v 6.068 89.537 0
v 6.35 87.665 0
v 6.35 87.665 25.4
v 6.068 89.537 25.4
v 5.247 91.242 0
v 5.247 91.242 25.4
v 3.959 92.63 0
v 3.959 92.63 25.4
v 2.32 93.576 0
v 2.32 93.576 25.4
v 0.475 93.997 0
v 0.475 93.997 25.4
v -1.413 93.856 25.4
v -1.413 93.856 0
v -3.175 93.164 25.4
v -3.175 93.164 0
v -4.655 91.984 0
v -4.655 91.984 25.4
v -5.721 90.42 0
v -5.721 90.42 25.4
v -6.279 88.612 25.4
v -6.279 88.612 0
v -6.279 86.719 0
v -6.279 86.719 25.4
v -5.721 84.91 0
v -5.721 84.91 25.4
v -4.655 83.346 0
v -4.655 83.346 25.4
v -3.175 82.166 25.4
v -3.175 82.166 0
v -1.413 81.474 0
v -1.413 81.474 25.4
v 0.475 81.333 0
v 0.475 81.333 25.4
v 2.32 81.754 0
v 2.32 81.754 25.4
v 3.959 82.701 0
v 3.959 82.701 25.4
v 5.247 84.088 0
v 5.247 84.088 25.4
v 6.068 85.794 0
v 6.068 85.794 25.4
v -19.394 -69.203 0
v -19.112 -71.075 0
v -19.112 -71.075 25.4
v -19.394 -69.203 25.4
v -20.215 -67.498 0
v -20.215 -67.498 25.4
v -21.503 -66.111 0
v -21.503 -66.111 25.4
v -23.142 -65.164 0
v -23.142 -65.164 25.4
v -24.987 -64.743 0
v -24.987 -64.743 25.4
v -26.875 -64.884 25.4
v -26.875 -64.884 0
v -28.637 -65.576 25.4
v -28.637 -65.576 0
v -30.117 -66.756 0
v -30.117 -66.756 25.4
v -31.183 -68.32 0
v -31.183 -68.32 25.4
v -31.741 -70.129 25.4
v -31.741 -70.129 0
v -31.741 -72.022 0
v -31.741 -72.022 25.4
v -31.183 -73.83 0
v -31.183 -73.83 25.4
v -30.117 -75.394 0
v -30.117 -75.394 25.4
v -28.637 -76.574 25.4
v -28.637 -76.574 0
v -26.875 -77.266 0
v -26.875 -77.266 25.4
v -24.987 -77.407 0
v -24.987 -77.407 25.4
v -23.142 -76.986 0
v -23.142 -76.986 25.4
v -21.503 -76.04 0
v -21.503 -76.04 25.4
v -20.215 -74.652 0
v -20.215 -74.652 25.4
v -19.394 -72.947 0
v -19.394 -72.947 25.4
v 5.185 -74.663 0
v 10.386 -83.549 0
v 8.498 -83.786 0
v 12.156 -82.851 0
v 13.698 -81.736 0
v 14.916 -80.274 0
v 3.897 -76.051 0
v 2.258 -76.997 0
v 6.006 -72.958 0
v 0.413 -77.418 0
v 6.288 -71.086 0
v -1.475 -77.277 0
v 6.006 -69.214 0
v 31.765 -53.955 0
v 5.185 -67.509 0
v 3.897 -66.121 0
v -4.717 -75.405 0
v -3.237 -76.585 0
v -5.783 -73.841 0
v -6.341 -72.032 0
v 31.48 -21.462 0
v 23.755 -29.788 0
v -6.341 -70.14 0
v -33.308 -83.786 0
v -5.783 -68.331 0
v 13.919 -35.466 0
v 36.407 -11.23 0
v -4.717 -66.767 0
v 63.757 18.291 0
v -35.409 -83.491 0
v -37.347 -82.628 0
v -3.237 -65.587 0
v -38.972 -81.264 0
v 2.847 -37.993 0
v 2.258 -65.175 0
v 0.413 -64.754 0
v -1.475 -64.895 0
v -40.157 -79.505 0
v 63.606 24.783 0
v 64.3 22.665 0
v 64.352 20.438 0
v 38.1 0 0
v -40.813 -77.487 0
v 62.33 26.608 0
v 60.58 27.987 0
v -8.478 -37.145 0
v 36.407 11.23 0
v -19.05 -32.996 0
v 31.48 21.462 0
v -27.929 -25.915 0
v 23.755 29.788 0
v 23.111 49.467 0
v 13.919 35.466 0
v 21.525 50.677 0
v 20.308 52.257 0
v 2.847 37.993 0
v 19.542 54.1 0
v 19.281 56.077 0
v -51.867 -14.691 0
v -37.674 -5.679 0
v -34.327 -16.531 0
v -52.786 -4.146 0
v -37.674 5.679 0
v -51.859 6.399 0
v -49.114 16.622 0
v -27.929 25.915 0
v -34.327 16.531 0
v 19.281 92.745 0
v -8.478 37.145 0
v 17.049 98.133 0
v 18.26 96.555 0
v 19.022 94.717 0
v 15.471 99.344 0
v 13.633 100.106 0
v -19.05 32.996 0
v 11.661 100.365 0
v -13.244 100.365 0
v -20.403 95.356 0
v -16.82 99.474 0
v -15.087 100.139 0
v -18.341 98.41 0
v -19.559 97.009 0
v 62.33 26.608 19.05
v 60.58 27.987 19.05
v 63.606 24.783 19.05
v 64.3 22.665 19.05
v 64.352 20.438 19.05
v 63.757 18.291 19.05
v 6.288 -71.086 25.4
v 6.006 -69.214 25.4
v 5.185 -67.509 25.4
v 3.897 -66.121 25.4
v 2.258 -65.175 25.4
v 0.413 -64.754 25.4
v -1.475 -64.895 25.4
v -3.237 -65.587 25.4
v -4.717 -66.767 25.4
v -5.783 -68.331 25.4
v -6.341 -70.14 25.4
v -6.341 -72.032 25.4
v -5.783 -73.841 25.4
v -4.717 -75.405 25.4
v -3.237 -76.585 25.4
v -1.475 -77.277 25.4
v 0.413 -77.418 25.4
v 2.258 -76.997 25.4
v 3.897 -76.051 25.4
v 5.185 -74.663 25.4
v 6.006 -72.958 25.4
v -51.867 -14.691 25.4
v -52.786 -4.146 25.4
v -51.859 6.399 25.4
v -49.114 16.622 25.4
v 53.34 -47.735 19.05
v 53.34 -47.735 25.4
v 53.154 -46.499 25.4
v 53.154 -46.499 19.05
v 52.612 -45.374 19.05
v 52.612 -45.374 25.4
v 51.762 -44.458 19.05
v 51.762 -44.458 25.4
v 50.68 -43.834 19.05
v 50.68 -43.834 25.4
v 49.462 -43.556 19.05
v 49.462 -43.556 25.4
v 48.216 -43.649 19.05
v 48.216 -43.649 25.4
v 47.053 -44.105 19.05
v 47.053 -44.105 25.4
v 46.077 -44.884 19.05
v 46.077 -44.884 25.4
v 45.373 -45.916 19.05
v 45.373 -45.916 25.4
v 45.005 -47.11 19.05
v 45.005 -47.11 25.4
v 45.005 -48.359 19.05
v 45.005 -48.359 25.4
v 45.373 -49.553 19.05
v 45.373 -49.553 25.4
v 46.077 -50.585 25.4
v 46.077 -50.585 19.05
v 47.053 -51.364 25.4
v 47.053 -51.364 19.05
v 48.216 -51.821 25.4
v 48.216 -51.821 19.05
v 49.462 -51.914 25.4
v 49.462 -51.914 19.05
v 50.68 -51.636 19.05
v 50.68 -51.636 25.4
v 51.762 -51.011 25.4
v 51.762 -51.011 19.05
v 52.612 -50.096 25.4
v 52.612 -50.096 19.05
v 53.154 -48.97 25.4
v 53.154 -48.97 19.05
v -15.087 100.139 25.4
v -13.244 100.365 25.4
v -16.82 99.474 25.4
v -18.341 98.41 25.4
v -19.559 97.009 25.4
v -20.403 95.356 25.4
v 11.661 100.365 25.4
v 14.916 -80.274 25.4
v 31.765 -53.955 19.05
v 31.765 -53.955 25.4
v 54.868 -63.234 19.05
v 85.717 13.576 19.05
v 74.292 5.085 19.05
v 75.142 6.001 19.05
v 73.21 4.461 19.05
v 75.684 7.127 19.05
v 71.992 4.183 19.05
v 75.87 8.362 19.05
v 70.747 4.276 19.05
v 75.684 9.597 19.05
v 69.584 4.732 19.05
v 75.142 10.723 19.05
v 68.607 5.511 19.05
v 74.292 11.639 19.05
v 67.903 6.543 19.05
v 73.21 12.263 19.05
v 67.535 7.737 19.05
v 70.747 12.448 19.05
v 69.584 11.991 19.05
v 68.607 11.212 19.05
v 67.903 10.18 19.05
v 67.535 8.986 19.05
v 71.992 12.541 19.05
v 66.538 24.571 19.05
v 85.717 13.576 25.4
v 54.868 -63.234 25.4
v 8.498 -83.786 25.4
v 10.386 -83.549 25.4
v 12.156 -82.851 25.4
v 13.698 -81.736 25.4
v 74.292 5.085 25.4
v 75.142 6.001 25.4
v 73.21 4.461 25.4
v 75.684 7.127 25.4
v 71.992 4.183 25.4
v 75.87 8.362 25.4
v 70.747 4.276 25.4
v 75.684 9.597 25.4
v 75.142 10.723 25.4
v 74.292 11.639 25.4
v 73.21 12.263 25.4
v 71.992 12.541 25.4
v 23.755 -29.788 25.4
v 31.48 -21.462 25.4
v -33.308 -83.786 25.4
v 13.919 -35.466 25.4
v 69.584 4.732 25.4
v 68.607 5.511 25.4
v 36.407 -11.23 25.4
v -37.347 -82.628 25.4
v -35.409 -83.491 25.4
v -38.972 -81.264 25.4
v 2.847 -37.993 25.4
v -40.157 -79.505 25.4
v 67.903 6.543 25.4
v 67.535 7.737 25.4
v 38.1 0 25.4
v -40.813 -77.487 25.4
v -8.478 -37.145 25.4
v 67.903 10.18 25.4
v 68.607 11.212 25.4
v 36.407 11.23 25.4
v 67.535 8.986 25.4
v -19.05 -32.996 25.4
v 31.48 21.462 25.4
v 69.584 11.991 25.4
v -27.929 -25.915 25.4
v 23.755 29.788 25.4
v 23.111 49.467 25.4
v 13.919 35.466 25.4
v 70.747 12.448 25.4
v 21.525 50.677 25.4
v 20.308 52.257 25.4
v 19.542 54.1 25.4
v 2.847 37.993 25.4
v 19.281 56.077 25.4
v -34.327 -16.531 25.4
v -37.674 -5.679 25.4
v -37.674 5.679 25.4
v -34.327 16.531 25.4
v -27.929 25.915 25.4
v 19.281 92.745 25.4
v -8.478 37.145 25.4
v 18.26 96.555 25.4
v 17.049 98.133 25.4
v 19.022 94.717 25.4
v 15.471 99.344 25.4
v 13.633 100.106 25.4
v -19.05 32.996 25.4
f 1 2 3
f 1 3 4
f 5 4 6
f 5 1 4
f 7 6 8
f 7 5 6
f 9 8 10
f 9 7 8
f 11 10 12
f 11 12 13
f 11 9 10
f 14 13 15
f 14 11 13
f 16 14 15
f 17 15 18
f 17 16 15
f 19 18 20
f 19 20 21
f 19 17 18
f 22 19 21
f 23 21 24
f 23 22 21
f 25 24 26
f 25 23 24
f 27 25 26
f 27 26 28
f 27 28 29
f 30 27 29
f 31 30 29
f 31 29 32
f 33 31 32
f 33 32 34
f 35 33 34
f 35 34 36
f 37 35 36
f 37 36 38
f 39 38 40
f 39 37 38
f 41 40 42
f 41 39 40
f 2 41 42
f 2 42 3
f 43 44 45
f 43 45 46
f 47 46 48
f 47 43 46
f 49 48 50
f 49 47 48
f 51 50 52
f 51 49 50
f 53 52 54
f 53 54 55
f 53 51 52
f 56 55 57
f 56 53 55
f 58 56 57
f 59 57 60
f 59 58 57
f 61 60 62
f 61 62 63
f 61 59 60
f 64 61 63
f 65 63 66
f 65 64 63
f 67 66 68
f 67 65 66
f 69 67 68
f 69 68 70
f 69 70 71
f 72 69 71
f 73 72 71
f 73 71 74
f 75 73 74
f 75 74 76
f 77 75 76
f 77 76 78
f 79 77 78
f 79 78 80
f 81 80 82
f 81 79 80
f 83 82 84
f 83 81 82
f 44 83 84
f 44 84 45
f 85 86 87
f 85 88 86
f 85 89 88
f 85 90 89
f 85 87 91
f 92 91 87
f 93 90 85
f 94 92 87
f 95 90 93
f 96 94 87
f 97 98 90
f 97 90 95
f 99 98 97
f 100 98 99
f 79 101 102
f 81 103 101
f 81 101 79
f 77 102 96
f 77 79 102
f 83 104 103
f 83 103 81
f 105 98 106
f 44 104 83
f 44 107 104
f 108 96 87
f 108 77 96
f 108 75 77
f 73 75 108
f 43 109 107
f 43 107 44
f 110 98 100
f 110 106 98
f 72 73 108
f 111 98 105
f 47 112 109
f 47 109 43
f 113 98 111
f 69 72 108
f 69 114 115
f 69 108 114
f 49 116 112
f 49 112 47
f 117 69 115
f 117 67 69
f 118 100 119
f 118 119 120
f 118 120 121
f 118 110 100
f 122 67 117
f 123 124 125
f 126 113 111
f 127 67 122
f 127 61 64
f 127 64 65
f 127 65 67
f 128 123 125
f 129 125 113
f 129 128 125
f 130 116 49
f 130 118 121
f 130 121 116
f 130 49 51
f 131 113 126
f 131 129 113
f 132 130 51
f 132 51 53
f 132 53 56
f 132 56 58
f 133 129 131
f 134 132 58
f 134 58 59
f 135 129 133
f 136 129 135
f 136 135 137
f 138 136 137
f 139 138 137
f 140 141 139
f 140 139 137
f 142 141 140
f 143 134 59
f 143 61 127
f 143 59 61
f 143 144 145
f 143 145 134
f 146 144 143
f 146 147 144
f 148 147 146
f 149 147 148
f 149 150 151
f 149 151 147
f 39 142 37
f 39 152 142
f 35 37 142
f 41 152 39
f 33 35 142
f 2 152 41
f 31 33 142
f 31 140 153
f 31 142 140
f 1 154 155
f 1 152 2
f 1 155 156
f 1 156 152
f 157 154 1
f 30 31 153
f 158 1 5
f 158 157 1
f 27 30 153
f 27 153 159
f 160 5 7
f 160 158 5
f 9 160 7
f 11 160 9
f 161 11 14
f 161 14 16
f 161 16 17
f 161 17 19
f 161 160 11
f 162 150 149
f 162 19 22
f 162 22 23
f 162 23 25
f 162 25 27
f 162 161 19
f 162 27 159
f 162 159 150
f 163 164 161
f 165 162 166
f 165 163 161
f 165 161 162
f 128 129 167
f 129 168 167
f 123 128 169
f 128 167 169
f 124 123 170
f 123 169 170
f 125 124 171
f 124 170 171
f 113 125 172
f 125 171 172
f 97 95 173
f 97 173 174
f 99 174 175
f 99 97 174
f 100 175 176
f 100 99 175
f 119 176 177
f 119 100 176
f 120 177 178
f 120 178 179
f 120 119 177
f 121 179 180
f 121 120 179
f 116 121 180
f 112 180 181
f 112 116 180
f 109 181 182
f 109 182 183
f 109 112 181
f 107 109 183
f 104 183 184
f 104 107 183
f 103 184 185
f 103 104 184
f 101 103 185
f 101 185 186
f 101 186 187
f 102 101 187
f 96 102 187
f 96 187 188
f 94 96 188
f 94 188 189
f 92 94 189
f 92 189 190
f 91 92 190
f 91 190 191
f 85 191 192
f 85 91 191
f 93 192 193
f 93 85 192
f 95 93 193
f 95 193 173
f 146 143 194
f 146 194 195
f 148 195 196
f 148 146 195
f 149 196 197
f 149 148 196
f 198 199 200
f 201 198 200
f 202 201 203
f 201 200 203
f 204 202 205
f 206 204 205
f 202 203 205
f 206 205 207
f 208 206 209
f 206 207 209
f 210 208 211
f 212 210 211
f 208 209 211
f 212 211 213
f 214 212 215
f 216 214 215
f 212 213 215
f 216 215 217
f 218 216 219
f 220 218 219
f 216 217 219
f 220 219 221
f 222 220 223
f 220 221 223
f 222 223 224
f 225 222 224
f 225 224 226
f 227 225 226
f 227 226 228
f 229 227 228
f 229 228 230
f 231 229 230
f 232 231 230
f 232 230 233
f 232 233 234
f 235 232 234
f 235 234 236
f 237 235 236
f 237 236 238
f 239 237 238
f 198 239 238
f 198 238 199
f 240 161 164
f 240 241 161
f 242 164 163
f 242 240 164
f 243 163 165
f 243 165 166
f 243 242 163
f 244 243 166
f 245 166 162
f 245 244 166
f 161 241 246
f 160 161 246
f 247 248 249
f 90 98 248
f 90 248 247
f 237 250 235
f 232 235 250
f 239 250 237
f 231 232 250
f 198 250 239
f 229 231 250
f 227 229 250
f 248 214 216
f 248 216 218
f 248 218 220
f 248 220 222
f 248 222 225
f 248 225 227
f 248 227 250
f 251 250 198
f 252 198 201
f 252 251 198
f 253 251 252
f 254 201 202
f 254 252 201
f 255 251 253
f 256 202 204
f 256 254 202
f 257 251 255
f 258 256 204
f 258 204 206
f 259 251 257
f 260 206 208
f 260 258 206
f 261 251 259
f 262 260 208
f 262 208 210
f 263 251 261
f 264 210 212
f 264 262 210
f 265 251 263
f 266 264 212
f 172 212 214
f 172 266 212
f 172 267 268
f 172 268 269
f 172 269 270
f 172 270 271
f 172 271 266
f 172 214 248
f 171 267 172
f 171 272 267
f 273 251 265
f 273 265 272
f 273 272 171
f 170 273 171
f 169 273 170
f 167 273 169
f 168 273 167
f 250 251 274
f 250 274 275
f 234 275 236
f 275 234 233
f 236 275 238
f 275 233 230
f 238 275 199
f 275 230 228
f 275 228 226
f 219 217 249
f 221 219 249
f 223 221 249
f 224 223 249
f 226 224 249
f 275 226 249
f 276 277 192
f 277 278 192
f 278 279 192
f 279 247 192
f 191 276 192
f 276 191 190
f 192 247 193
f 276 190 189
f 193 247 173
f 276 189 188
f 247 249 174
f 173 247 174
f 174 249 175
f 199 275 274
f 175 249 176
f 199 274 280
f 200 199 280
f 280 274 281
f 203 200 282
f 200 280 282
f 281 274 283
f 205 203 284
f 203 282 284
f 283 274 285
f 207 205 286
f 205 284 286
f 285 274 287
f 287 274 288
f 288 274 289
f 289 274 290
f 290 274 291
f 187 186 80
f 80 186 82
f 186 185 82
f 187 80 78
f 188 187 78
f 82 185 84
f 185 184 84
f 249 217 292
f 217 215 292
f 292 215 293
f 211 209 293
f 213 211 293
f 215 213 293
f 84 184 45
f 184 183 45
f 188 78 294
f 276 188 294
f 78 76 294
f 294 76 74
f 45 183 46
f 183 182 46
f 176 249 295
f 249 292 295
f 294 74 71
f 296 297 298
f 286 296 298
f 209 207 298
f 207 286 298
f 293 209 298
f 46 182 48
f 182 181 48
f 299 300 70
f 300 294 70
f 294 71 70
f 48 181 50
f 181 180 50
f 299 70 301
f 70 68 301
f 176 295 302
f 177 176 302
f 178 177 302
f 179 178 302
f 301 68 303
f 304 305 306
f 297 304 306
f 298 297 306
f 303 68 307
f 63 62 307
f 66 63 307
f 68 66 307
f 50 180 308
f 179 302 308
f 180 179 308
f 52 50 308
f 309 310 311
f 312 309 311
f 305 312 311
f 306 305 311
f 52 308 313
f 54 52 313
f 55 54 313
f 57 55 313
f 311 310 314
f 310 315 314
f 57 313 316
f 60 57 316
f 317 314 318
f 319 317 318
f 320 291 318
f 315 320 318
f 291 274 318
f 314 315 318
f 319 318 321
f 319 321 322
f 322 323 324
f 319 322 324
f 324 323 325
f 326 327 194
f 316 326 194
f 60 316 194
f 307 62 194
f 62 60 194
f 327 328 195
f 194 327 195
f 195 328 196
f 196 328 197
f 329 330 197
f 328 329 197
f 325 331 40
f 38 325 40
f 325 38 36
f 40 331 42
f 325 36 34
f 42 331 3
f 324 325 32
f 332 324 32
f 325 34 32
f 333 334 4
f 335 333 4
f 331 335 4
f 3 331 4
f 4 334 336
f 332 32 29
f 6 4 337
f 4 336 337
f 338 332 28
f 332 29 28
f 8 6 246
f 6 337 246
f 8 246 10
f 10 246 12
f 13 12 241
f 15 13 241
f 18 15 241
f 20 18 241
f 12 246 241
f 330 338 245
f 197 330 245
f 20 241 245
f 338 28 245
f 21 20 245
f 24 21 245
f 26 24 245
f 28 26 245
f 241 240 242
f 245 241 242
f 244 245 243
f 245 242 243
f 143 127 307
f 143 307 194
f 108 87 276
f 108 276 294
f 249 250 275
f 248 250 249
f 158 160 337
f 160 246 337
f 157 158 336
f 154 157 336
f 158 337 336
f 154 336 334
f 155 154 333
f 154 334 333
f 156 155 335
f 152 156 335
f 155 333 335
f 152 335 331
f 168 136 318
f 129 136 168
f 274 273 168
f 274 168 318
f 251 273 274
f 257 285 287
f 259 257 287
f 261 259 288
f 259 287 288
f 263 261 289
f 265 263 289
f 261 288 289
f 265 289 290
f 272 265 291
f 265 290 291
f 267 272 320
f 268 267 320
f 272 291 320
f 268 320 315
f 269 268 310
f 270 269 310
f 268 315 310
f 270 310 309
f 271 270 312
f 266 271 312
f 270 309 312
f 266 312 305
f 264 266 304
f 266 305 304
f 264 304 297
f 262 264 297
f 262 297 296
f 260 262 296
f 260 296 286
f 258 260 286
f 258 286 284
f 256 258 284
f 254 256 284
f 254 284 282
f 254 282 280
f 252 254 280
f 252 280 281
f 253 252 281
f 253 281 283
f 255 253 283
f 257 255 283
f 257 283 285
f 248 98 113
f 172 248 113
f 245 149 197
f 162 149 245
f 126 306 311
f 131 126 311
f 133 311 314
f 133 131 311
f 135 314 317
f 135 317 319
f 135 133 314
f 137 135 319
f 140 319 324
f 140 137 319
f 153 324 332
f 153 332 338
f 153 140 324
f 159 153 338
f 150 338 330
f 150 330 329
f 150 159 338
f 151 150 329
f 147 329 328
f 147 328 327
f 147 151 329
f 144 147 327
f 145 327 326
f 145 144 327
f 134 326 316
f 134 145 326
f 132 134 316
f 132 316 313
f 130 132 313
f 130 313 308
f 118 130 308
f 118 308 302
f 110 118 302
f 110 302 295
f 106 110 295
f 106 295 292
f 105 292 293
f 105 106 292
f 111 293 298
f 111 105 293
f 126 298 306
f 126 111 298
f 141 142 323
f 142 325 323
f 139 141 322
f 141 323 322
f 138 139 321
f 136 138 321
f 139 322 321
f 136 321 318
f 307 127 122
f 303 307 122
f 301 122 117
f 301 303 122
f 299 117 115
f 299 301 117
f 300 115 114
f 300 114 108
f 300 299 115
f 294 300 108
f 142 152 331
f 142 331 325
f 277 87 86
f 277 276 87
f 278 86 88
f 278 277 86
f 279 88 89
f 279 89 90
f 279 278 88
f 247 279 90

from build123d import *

# Parameters (mm, degrees)
SKETCH1_R           = 38.1
SKETCH1_R_2         = 6.35
BOSS_EXTRUDE1_DEPTH = 25.4
CUT_EXTRUDE1_DEPTH  = 19.05
SKETCH3_R           = 4.191
CUT_EXTRUDE2_DEPTH  = 135.408969451
FILLET1_R           = 7.62


with BuildPart() as part:
    # Sketch1 → Boss-Extrude1 (new body)
    with BuildSketch(Plane.XY):
        with BuildLine():
            Line((-18.576252895, 100.365223368), (19.281255226, 100.365223368))
            Line((19.281255226, 100.365223368), (19.281255226, 51.662487547))
            Line((19.281255226, 51.662487547), (85.717168685, 13.57632424))
            Line((85.717168685, 13.57632424), (54.8677317, -63.233808937))
            Line((54.8677317, -63.233808937), (31.764899533, -53.954963352))
            Line((31.764899533, -53.954963352), (12.667818141, -83.786038719))
            Line((12.667818141, -83.786038719), (-39.703691579, -83.786038719))
            Line((-39.703691579, -83.786038719), (-51.867045524, -14.691351221))
            ThreePointArc((-51.867045524, -14.691351221), (-52.552830667, 1.14672743), (-49.113541671, 16.622073237))
            Line((-49.113541671, 16.622073237), (-18.576252895, 100.365223368))
        make_face()
        Circle(SKETCH1_R, mode=Mode.SUBTRACT)
        with Locations((0, 87.665223368)):
            Circle(SKETCH1_R_2, mode=Mode.SUBTRACT)
        with Locations((-0.06167368, -71.086038719)):
            Circle(SKETCH1_R_2, mode=Mode.SUBTRACT)
        with Locations((-25.46167368, -71.075181752)):
            Circle(SKETCH1_R_2, mode=Mode.SUBTRACT)
    extrude(amount=BOSS_EXTRUDE1_DEPTH)

    # Sketch2 → Cut-Extrude1 (cut)
    with BuildSketch(Plane.XY):
        Polygon((54.8677317, -63.233808937), (31.764899533, -53.954963352), (66.538177491, 24.571193621), (85.717168685, 13.57632424), align=None)
    extrude(amount=CUT_EXTRUDE1_DEPTH, mode=Mode.SUBTRACT)

    # Sketch3 → Cut-Extrude2 (cut, through all)
    with BuildSketch(Plane.XY.offset(25.4)):
        with Locations((71.679164996, 8.361848351)):
            Circle(SKETCH3_R)
        with Locations((49.148937242, -47.734792738)):
            Circle(SKETCH3_R)
    extrude(amount=-CUT_EXTRUDE2_DEPTH, mode=Mode.SUBTRACT)

    # Fillet1
    fillet1_edges = [part.edges().sort_by_distance(p)[0] for p in [
        (12.667818141, -83.786038719, 12.7),
        (-39.703691579, -83.786038719, 12.7),
        (-18.576252895, 100.365223368, 12.7),
        (19.281255226, 100.365223368, 12.7),
        (19.281255226, 51.662487547, 12.7),
        (66.538177491, 24.571193621, 9.525),
    ]]
    fillet(fillet1_edges, radius=FILLET1_R)


solid = part.part
